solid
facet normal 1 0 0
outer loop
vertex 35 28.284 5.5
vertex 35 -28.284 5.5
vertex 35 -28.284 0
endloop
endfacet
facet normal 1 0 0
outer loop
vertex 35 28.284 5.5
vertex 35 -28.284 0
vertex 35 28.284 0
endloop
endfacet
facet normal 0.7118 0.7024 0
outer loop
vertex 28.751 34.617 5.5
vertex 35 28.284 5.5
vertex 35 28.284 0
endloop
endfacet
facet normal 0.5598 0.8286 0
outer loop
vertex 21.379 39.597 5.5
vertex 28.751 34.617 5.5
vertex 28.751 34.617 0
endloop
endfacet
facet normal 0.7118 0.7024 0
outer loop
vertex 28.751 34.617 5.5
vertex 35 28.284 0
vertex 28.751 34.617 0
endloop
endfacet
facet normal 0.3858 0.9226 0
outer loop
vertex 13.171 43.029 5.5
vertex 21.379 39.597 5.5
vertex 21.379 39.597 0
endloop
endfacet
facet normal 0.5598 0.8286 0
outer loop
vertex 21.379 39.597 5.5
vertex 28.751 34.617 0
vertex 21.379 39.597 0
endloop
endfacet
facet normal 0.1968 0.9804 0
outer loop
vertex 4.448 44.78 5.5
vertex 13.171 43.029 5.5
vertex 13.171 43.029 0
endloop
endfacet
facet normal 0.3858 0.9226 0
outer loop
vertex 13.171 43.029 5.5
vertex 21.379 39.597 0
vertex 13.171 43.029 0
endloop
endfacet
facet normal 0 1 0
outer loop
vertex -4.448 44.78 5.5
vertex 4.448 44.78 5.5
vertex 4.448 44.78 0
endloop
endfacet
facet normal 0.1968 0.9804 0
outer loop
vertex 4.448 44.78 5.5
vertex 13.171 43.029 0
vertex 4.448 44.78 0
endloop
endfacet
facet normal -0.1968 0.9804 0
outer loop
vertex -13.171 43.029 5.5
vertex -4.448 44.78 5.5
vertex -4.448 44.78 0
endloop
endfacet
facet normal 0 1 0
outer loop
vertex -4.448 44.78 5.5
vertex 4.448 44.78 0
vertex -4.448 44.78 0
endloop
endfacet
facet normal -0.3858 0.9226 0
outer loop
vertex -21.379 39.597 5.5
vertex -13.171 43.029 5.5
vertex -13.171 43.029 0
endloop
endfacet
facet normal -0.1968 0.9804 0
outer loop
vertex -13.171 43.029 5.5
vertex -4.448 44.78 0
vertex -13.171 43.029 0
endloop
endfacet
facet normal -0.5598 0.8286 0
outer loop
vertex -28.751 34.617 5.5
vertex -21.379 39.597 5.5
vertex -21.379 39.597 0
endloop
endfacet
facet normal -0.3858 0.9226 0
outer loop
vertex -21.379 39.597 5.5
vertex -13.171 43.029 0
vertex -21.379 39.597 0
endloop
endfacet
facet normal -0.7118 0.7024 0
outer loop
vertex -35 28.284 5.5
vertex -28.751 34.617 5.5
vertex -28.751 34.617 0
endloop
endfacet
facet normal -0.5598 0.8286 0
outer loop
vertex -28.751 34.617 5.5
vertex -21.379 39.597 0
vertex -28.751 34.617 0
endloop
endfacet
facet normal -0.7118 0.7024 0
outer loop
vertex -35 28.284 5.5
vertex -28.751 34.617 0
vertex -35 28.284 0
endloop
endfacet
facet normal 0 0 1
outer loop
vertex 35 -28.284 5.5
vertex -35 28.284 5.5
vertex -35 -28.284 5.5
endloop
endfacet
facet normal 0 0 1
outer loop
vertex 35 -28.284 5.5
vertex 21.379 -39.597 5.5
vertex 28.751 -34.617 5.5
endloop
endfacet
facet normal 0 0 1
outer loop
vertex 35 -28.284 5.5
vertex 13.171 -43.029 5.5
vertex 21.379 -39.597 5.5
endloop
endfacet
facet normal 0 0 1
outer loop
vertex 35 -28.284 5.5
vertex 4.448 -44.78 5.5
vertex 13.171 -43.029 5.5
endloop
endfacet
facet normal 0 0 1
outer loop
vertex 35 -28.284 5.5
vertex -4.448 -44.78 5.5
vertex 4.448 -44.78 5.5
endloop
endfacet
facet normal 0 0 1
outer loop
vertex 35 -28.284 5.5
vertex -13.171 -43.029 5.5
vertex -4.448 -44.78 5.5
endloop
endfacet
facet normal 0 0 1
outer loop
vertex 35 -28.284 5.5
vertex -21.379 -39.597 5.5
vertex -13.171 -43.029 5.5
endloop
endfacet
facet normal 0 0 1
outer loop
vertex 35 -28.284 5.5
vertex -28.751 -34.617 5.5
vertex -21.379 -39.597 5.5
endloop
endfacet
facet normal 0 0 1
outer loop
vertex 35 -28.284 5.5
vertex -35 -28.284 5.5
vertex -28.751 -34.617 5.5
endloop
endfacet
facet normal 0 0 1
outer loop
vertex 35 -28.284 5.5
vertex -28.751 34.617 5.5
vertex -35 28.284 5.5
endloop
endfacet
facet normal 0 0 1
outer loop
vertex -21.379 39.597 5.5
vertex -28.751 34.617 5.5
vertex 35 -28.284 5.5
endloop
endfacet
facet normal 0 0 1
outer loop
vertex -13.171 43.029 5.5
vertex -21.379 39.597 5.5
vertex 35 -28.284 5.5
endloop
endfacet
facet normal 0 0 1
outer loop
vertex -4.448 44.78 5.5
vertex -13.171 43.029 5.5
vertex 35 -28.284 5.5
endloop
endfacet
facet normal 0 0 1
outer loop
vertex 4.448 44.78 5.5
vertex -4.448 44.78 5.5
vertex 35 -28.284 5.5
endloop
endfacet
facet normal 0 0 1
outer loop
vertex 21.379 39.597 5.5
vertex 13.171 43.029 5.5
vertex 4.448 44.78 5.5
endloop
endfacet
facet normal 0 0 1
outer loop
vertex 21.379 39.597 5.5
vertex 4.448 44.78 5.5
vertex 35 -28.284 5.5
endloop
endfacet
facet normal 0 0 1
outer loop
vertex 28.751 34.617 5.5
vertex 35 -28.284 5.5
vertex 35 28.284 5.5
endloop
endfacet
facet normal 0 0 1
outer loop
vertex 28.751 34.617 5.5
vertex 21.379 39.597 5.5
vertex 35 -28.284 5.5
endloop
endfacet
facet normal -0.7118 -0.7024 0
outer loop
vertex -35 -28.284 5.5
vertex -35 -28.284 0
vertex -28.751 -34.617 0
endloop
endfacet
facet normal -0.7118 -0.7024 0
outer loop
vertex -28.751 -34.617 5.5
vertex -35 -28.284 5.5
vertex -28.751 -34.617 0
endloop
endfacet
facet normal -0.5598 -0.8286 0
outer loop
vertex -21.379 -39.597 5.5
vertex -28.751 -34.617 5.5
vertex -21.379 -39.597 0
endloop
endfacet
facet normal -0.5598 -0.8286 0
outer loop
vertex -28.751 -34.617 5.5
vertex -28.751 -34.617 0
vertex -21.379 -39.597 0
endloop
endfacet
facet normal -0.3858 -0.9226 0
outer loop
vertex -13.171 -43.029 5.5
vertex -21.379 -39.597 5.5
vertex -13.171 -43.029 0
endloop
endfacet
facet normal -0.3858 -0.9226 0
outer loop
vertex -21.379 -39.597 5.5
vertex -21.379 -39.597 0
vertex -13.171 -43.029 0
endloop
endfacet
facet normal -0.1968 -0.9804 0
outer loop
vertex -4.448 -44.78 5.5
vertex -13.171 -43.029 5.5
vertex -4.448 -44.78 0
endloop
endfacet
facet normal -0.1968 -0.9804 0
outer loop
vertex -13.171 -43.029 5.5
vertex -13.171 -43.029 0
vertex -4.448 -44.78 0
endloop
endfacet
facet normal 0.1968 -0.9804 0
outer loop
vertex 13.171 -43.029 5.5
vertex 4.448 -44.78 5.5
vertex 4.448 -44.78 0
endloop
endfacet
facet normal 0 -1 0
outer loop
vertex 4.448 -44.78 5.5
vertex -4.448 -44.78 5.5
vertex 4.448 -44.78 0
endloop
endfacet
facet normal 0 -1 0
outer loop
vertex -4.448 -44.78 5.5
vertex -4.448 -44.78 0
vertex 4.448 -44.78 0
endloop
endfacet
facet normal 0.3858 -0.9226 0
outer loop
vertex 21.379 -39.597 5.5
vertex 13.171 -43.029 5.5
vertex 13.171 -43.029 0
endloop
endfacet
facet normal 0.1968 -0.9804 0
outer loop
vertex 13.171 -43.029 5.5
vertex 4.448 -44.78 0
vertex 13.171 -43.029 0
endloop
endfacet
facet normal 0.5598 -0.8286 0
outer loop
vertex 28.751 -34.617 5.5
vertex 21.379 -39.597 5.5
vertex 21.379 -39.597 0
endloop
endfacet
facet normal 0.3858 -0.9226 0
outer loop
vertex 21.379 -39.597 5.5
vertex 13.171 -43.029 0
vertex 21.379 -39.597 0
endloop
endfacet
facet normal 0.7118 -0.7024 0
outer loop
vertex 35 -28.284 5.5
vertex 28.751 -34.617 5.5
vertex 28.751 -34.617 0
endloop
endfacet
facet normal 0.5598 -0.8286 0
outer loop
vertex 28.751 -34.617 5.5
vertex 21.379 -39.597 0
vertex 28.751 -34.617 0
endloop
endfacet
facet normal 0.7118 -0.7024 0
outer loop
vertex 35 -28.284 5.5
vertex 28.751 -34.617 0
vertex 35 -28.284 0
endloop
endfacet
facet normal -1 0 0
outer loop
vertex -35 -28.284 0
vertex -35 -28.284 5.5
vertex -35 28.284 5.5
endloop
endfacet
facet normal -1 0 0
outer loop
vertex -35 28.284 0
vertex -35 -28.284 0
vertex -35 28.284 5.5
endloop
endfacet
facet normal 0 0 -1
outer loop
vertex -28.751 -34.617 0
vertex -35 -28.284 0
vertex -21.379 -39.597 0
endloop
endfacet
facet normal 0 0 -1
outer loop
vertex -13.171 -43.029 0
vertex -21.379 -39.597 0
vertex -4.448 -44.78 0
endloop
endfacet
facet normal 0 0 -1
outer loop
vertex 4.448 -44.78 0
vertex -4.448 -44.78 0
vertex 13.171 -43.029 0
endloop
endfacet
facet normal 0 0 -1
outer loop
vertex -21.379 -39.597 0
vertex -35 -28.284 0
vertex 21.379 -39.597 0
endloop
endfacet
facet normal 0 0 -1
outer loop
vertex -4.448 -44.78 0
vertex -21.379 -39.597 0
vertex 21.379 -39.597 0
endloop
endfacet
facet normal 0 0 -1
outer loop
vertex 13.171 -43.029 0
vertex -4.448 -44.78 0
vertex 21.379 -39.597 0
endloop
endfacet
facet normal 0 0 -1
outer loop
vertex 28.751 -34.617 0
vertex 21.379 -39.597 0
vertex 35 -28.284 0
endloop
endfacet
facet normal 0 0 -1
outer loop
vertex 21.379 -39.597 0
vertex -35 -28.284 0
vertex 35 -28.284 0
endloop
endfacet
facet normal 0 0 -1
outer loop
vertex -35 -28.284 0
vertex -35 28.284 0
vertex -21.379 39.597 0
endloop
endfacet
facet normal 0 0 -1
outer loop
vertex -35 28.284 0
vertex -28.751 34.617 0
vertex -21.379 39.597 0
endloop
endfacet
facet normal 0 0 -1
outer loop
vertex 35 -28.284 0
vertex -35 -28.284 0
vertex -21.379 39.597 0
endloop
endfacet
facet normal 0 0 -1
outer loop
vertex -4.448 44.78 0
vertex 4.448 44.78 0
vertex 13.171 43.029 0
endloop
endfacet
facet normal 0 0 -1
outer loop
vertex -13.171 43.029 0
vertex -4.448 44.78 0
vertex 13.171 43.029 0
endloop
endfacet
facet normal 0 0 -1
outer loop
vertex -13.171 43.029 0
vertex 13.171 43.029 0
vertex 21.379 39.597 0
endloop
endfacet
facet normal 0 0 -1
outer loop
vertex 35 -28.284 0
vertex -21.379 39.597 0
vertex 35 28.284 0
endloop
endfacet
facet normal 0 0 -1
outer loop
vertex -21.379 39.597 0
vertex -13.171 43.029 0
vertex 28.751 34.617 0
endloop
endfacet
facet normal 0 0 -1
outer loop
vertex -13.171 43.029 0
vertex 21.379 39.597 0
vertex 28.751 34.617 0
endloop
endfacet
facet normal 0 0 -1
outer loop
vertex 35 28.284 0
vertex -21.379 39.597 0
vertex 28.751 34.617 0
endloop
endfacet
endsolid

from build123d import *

# Parameters (mm, degrees)
SKETCH_1_R     = 45
PAD_1_DEPTH    = 5.5
SKETCH_2_W     = 15
SKETCH_2_H     = 100
POCKET_2_DEPTH = 5.501
SKETCH_3_W     = 15
SKETCH_3_H     = 100
POCKET_3_DEPTH = 5.501


with BuildPart() as part:
    # Sketch_1 → Pad_1 (new body)
    with BuildSketch(Plane.XY):
        Circle(SKETCH_1_R)
    extrude(amount=PAD_1_DEPTH)

    # Sketch_2 (on Face3 of Pad_1) → Pocket_2 (cut, through all)
    with BuildSketch(Plane.XY.offset(5.5)):
        with Locations((-42.5, 0)):
            Rectangle(SKETCH_2_W, SKETCH_2_H)
    extrude(amount=-POCKET_2_DEPTH, mode=Mode.SUBTRACT)

    # Sketch_3 (on Face3 of Pocket_2) → Pocket_3 (cut, through all)
    with BuildSketch(Plane.XY.offset(5.5)):
        with Locations((42.5, 0)):
            Rectangle(SKETCH_3_W, SKETCH_3_H)
    extrude(amount=-POCKET_3_DEPTH, mode=Mode.SUBTRACT)


solid = part.part
